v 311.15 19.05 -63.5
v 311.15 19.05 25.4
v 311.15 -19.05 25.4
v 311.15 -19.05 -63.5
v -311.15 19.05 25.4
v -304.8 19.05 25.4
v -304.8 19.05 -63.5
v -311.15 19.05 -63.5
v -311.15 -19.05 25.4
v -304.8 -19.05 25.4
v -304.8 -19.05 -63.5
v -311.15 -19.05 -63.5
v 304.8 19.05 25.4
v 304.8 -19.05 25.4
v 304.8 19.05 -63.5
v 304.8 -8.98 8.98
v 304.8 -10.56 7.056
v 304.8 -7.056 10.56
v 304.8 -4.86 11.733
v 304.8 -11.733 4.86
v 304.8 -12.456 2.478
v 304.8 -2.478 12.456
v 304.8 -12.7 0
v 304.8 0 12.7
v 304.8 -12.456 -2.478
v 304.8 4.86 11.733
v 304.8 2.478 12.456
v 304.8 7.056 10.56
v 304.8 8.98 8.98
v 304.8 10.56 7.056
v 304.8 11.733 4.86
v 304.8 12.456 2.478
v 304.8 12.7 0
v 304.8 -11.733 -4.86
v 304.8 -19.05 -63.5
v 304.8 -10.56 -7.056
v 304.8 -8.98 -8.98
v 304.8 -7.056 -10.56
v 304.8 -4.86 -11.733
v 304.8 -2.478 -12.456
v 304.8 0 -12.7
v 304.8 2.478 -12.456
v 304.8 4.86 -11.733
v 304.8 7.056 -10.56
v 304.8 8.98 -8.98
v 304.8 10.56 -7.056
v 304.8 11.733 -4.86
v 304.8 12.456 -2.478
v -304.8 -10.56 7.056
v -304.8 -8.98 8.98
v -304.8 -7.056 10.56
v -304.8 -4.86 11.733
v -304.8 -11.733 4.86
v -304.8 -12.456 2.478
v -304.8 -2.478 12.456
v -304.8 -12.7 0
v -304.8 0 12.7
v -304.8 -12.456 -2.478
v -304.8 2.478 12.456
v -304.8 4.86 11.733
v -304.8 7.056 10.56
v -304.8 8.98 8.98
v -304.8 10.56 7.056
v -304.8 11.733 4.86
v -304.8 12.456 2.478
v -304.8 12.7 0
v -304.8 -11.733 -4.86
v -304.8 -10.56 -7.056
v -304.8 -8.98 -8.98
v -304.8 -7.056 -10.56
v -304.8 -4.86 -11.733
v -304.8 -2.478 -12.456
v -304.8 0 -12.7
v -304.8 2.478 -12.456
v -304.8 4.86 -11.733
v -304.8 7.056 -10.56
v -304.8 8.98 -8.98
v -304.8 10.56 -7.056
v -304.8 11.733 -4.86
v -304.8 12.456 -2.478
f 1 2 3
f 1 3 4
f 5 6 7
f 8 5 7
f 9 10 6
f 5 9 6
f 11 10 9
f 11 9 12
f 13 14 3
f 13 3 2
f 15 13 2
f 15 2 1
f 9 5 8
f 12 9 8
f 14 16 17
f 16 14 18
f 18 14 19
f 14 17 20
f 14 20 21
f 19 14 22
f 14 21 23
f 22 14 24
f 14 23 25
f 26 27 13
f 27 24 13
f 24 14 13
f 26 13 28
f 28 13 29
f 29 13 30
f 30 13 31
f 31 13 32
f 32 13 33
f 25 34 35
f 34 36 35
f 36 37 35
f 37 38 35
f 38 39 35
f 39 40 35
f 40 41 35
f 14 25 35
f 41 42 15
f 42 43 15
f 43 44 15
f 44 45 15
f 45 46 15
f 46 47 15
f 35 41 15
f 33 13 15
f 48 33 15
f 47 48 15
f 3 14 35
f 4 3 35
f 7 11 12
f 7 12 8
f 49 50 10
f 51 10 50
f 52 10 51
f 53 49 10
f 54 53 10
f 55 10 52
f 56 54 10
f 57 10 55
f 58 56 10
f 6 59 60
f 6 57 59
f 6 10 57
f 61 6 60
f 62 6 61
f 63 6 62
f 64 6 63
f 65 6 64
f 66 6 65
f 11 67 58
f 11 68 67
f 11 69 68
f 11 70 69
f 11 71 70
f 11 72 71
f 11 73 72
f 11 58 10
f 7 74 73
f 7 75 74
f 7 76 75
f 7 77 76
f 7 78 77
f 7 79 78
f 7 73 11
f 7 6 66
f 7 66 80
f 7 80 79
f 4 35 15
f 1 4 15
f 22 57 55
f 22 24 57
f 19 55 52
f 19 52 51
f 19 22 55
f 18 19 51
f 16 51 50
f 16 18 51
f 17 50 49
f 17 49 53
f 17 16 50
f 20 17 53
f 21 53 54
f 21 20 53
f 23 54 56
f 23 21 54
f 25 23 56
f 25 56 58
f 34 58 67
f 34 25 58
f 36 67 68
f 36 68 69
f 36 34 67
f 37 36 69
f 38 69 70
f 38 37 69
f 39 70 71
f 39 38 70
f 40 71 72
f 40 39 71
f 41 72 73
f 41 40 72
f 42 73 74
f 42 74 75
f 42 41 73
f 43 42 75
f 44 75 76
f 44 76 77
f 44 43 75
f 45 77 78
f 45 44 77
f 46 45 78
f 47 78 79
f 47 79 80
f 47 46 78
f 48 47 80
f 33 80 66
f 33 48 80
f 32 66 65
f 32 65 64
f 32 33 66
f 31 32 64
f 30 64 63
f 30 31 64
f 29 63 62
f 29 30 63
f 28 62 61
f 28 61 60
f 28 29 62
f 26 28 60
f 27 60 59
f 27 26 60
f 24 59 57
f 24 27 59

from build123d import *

# Parameters (mm, degrees)
SKETCH1_R           = 12.7
BOSS_EXTRUDE1_DEPTH = 304.8
SKETCH2_W           = 88.9
SKETCH2_H           = 38.1
BOSS_EXTRUDE2_DEPTH = 6.35


with BuildPart() as part:
    # Sketch1 → Boss-Extrude1 (new, symmetric)
    with BuildSketch(Plane(origin=(0, 0, 0), x_dir=(0, 0, -1), z_dir=(1, 0, 0))):
        with Locations(Location((0, 0, 0), (0, 0, 180))):
            Circle(SKETCH1_R)
    extrude(amount=BOSS_EXTRUDE1_DEPTH, both=True)

    # Sketch2 → Boss-Extrude2 (add)
    with BuildSketch(Plane(origin=(304.8, 0, 0), x_dir=(0, 0, -1), z_dir=(1, 0, 0))):
        with Locations((19.05, 0)):
            Rectangle(SKETCH2_W, SKETCH2_H)
    boss_extrude2 = extrude(amount=BOSS_EXTRUDE2_DEPTH)

    # Mirror1: Boss-Extrude2 across plane
    add(boss_extrude2.mirror(Plane(origin=(0, 0, 0), x_dir=(0, 0, 1), z_dir=(1, 0, 0))))


solid = part.part
